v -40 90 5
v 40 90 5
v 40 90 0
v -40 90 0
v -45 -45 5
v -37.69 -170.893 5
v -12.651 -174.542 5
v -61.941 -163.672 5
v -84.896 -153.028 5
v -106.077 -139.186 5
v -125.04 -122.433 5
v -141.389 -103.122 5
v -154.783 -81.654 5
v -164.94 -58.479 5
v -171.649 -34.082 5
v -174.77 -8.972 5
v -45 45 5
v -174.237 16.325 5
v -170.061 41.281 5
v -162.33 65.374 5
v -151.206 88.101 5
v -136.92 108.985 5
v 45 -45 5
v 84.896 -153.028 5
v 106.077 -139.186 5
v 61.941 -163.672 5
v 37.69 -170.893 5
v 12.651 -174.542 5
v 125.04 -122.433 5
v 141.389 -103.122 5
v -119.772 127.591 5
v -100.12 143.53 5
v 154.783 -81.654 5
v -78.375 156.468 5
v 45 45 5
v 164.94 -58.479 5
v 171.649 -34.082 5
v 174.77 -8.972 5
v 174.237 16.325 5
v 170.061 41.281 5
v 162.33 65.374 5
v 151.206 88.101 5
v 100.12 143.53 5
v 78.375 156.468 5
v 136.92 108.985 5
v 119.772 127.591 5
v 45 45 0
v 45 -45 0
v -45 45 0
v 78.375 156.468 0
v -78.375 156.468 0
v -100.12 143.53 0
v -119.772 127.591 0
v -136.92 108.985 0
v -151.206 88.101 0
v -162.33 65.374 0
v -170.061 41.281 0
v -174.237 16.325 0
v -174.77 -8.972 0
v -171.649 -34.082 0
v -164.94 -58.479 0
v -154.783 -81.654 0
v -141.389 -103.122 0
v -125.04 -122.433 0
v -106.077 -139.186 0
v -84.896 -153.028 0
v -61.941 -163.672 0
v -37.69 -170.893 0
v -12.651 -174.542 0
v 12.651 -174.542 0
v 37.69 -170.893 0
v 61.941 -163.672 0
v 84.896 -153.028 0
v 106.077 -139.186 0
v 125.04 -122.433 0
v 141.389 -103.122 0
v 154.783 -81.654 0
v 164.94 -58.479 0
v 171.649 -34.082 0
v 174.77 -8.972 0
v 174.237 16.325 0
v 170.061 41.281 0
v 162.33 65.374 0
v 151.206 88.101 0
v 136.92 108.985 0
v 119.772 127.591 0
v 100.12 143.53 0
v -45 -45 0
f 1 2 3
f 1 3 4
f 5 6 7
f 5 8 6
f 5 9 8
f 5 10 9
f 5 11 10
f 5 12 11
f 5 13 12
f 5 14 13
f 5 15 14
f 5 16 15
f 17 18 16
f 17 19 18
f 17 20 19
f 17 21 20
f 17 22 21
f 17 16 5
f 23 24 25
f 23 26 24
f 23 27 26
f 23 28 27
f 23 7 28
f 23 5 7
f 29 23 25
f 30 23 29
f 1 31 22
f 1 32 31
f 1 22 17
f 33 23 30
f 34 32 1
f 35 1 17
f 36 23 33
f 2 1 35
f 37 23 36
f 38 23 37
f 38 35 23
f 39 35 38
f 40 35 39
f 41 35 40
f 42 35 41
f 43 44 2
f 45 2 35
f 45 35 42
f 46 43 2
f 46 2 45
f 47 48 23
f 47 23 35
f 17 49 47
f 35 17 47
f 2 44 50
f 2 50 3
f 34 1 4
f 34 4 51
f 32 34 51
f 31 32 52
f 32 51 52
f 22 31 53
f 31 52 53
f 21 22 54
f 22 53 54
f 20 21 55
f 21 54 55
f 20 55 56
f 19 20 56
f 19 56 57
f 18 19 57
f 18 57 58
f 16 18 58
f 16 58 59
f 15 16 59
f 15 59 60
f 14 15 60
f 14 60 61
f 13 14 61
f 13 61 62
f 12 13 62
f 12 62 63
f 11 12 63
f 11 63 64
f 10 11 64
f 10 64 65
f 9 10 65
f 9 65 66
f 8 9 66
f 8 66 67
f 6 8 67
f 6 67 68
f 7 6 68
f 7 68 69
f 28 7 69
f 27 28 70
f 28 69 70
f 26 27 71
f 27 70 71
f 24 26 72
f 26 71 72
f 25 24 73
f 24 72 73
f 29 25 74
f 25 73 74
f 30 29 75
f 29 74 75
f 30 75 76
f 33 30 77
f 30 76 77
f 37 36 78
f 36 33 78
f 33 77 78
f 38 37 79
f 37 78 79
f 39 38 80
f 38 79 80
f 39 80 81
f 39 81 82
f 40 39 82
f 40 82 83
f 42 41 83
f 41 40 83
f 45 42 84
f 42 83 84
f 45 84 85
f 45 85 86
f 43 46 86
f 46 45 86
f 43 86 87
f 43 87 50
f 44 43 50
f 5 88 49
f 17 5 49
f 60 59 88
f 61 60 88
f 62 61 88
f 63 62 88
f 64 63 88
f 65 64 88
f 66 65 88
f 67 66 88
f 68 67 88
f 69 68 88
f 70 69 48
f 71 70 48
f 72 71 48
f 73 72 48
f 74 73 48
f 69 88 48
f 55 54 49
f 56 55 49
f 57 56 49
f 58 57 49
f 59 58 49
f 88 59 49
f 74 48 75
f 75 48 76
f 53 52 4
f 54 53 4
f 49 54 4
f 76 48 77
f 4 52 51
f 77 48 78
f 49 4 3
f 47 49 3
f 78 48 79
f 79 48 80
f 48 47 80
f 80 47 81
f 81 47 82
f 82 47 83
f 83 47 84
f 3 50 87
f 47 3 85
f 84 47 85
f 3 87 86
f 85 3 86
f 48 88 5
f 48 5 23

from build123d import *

# Parameters (mm, degrees)
ESQUISSE1_R             = 175
ESQUISSE1_W             = 90
ESQUISSE1_H             = 90
BOSS_EXTRU_1_DEPTH      = 5
ENL_V_MAT_EXTRU_1_DEPTH = 10


with BuildPart() as part:
    # Esquisse1 → Boss.-Extru.1 (new body)
    with BuildSketch(Plane.XY):
        Circle(ESQUISSE1_R)
        Rectangle(ESQUISSE1_W, ESQUISSE1_H, mode=Mode.SUBTRACT)
    extrude(amount=BOSS_EXTRU_1_DEPTH)

    # Esquisse2 → Enlèv. mat.-Extru.1 (cut)
    with BuildSketch(Plane.XY.offset(5)):
        with BuildLine():
            Line((78.375424383, 156.468184794), (40, 90))
            Line((40, 90), (-40, 90))
            Line((-40, 90), (-78.375424383, 156.468184794))
            ThreePointArc((-78.375424383, 156.468184794), (0, 177.468816464), (78.375424383, 156.468184794))
        make_face()
    extrude(amount=-ENL_V_MAT_EXTRU_1_DEPTH, mode=Mode.SUBTRACT)


solid = part.part
